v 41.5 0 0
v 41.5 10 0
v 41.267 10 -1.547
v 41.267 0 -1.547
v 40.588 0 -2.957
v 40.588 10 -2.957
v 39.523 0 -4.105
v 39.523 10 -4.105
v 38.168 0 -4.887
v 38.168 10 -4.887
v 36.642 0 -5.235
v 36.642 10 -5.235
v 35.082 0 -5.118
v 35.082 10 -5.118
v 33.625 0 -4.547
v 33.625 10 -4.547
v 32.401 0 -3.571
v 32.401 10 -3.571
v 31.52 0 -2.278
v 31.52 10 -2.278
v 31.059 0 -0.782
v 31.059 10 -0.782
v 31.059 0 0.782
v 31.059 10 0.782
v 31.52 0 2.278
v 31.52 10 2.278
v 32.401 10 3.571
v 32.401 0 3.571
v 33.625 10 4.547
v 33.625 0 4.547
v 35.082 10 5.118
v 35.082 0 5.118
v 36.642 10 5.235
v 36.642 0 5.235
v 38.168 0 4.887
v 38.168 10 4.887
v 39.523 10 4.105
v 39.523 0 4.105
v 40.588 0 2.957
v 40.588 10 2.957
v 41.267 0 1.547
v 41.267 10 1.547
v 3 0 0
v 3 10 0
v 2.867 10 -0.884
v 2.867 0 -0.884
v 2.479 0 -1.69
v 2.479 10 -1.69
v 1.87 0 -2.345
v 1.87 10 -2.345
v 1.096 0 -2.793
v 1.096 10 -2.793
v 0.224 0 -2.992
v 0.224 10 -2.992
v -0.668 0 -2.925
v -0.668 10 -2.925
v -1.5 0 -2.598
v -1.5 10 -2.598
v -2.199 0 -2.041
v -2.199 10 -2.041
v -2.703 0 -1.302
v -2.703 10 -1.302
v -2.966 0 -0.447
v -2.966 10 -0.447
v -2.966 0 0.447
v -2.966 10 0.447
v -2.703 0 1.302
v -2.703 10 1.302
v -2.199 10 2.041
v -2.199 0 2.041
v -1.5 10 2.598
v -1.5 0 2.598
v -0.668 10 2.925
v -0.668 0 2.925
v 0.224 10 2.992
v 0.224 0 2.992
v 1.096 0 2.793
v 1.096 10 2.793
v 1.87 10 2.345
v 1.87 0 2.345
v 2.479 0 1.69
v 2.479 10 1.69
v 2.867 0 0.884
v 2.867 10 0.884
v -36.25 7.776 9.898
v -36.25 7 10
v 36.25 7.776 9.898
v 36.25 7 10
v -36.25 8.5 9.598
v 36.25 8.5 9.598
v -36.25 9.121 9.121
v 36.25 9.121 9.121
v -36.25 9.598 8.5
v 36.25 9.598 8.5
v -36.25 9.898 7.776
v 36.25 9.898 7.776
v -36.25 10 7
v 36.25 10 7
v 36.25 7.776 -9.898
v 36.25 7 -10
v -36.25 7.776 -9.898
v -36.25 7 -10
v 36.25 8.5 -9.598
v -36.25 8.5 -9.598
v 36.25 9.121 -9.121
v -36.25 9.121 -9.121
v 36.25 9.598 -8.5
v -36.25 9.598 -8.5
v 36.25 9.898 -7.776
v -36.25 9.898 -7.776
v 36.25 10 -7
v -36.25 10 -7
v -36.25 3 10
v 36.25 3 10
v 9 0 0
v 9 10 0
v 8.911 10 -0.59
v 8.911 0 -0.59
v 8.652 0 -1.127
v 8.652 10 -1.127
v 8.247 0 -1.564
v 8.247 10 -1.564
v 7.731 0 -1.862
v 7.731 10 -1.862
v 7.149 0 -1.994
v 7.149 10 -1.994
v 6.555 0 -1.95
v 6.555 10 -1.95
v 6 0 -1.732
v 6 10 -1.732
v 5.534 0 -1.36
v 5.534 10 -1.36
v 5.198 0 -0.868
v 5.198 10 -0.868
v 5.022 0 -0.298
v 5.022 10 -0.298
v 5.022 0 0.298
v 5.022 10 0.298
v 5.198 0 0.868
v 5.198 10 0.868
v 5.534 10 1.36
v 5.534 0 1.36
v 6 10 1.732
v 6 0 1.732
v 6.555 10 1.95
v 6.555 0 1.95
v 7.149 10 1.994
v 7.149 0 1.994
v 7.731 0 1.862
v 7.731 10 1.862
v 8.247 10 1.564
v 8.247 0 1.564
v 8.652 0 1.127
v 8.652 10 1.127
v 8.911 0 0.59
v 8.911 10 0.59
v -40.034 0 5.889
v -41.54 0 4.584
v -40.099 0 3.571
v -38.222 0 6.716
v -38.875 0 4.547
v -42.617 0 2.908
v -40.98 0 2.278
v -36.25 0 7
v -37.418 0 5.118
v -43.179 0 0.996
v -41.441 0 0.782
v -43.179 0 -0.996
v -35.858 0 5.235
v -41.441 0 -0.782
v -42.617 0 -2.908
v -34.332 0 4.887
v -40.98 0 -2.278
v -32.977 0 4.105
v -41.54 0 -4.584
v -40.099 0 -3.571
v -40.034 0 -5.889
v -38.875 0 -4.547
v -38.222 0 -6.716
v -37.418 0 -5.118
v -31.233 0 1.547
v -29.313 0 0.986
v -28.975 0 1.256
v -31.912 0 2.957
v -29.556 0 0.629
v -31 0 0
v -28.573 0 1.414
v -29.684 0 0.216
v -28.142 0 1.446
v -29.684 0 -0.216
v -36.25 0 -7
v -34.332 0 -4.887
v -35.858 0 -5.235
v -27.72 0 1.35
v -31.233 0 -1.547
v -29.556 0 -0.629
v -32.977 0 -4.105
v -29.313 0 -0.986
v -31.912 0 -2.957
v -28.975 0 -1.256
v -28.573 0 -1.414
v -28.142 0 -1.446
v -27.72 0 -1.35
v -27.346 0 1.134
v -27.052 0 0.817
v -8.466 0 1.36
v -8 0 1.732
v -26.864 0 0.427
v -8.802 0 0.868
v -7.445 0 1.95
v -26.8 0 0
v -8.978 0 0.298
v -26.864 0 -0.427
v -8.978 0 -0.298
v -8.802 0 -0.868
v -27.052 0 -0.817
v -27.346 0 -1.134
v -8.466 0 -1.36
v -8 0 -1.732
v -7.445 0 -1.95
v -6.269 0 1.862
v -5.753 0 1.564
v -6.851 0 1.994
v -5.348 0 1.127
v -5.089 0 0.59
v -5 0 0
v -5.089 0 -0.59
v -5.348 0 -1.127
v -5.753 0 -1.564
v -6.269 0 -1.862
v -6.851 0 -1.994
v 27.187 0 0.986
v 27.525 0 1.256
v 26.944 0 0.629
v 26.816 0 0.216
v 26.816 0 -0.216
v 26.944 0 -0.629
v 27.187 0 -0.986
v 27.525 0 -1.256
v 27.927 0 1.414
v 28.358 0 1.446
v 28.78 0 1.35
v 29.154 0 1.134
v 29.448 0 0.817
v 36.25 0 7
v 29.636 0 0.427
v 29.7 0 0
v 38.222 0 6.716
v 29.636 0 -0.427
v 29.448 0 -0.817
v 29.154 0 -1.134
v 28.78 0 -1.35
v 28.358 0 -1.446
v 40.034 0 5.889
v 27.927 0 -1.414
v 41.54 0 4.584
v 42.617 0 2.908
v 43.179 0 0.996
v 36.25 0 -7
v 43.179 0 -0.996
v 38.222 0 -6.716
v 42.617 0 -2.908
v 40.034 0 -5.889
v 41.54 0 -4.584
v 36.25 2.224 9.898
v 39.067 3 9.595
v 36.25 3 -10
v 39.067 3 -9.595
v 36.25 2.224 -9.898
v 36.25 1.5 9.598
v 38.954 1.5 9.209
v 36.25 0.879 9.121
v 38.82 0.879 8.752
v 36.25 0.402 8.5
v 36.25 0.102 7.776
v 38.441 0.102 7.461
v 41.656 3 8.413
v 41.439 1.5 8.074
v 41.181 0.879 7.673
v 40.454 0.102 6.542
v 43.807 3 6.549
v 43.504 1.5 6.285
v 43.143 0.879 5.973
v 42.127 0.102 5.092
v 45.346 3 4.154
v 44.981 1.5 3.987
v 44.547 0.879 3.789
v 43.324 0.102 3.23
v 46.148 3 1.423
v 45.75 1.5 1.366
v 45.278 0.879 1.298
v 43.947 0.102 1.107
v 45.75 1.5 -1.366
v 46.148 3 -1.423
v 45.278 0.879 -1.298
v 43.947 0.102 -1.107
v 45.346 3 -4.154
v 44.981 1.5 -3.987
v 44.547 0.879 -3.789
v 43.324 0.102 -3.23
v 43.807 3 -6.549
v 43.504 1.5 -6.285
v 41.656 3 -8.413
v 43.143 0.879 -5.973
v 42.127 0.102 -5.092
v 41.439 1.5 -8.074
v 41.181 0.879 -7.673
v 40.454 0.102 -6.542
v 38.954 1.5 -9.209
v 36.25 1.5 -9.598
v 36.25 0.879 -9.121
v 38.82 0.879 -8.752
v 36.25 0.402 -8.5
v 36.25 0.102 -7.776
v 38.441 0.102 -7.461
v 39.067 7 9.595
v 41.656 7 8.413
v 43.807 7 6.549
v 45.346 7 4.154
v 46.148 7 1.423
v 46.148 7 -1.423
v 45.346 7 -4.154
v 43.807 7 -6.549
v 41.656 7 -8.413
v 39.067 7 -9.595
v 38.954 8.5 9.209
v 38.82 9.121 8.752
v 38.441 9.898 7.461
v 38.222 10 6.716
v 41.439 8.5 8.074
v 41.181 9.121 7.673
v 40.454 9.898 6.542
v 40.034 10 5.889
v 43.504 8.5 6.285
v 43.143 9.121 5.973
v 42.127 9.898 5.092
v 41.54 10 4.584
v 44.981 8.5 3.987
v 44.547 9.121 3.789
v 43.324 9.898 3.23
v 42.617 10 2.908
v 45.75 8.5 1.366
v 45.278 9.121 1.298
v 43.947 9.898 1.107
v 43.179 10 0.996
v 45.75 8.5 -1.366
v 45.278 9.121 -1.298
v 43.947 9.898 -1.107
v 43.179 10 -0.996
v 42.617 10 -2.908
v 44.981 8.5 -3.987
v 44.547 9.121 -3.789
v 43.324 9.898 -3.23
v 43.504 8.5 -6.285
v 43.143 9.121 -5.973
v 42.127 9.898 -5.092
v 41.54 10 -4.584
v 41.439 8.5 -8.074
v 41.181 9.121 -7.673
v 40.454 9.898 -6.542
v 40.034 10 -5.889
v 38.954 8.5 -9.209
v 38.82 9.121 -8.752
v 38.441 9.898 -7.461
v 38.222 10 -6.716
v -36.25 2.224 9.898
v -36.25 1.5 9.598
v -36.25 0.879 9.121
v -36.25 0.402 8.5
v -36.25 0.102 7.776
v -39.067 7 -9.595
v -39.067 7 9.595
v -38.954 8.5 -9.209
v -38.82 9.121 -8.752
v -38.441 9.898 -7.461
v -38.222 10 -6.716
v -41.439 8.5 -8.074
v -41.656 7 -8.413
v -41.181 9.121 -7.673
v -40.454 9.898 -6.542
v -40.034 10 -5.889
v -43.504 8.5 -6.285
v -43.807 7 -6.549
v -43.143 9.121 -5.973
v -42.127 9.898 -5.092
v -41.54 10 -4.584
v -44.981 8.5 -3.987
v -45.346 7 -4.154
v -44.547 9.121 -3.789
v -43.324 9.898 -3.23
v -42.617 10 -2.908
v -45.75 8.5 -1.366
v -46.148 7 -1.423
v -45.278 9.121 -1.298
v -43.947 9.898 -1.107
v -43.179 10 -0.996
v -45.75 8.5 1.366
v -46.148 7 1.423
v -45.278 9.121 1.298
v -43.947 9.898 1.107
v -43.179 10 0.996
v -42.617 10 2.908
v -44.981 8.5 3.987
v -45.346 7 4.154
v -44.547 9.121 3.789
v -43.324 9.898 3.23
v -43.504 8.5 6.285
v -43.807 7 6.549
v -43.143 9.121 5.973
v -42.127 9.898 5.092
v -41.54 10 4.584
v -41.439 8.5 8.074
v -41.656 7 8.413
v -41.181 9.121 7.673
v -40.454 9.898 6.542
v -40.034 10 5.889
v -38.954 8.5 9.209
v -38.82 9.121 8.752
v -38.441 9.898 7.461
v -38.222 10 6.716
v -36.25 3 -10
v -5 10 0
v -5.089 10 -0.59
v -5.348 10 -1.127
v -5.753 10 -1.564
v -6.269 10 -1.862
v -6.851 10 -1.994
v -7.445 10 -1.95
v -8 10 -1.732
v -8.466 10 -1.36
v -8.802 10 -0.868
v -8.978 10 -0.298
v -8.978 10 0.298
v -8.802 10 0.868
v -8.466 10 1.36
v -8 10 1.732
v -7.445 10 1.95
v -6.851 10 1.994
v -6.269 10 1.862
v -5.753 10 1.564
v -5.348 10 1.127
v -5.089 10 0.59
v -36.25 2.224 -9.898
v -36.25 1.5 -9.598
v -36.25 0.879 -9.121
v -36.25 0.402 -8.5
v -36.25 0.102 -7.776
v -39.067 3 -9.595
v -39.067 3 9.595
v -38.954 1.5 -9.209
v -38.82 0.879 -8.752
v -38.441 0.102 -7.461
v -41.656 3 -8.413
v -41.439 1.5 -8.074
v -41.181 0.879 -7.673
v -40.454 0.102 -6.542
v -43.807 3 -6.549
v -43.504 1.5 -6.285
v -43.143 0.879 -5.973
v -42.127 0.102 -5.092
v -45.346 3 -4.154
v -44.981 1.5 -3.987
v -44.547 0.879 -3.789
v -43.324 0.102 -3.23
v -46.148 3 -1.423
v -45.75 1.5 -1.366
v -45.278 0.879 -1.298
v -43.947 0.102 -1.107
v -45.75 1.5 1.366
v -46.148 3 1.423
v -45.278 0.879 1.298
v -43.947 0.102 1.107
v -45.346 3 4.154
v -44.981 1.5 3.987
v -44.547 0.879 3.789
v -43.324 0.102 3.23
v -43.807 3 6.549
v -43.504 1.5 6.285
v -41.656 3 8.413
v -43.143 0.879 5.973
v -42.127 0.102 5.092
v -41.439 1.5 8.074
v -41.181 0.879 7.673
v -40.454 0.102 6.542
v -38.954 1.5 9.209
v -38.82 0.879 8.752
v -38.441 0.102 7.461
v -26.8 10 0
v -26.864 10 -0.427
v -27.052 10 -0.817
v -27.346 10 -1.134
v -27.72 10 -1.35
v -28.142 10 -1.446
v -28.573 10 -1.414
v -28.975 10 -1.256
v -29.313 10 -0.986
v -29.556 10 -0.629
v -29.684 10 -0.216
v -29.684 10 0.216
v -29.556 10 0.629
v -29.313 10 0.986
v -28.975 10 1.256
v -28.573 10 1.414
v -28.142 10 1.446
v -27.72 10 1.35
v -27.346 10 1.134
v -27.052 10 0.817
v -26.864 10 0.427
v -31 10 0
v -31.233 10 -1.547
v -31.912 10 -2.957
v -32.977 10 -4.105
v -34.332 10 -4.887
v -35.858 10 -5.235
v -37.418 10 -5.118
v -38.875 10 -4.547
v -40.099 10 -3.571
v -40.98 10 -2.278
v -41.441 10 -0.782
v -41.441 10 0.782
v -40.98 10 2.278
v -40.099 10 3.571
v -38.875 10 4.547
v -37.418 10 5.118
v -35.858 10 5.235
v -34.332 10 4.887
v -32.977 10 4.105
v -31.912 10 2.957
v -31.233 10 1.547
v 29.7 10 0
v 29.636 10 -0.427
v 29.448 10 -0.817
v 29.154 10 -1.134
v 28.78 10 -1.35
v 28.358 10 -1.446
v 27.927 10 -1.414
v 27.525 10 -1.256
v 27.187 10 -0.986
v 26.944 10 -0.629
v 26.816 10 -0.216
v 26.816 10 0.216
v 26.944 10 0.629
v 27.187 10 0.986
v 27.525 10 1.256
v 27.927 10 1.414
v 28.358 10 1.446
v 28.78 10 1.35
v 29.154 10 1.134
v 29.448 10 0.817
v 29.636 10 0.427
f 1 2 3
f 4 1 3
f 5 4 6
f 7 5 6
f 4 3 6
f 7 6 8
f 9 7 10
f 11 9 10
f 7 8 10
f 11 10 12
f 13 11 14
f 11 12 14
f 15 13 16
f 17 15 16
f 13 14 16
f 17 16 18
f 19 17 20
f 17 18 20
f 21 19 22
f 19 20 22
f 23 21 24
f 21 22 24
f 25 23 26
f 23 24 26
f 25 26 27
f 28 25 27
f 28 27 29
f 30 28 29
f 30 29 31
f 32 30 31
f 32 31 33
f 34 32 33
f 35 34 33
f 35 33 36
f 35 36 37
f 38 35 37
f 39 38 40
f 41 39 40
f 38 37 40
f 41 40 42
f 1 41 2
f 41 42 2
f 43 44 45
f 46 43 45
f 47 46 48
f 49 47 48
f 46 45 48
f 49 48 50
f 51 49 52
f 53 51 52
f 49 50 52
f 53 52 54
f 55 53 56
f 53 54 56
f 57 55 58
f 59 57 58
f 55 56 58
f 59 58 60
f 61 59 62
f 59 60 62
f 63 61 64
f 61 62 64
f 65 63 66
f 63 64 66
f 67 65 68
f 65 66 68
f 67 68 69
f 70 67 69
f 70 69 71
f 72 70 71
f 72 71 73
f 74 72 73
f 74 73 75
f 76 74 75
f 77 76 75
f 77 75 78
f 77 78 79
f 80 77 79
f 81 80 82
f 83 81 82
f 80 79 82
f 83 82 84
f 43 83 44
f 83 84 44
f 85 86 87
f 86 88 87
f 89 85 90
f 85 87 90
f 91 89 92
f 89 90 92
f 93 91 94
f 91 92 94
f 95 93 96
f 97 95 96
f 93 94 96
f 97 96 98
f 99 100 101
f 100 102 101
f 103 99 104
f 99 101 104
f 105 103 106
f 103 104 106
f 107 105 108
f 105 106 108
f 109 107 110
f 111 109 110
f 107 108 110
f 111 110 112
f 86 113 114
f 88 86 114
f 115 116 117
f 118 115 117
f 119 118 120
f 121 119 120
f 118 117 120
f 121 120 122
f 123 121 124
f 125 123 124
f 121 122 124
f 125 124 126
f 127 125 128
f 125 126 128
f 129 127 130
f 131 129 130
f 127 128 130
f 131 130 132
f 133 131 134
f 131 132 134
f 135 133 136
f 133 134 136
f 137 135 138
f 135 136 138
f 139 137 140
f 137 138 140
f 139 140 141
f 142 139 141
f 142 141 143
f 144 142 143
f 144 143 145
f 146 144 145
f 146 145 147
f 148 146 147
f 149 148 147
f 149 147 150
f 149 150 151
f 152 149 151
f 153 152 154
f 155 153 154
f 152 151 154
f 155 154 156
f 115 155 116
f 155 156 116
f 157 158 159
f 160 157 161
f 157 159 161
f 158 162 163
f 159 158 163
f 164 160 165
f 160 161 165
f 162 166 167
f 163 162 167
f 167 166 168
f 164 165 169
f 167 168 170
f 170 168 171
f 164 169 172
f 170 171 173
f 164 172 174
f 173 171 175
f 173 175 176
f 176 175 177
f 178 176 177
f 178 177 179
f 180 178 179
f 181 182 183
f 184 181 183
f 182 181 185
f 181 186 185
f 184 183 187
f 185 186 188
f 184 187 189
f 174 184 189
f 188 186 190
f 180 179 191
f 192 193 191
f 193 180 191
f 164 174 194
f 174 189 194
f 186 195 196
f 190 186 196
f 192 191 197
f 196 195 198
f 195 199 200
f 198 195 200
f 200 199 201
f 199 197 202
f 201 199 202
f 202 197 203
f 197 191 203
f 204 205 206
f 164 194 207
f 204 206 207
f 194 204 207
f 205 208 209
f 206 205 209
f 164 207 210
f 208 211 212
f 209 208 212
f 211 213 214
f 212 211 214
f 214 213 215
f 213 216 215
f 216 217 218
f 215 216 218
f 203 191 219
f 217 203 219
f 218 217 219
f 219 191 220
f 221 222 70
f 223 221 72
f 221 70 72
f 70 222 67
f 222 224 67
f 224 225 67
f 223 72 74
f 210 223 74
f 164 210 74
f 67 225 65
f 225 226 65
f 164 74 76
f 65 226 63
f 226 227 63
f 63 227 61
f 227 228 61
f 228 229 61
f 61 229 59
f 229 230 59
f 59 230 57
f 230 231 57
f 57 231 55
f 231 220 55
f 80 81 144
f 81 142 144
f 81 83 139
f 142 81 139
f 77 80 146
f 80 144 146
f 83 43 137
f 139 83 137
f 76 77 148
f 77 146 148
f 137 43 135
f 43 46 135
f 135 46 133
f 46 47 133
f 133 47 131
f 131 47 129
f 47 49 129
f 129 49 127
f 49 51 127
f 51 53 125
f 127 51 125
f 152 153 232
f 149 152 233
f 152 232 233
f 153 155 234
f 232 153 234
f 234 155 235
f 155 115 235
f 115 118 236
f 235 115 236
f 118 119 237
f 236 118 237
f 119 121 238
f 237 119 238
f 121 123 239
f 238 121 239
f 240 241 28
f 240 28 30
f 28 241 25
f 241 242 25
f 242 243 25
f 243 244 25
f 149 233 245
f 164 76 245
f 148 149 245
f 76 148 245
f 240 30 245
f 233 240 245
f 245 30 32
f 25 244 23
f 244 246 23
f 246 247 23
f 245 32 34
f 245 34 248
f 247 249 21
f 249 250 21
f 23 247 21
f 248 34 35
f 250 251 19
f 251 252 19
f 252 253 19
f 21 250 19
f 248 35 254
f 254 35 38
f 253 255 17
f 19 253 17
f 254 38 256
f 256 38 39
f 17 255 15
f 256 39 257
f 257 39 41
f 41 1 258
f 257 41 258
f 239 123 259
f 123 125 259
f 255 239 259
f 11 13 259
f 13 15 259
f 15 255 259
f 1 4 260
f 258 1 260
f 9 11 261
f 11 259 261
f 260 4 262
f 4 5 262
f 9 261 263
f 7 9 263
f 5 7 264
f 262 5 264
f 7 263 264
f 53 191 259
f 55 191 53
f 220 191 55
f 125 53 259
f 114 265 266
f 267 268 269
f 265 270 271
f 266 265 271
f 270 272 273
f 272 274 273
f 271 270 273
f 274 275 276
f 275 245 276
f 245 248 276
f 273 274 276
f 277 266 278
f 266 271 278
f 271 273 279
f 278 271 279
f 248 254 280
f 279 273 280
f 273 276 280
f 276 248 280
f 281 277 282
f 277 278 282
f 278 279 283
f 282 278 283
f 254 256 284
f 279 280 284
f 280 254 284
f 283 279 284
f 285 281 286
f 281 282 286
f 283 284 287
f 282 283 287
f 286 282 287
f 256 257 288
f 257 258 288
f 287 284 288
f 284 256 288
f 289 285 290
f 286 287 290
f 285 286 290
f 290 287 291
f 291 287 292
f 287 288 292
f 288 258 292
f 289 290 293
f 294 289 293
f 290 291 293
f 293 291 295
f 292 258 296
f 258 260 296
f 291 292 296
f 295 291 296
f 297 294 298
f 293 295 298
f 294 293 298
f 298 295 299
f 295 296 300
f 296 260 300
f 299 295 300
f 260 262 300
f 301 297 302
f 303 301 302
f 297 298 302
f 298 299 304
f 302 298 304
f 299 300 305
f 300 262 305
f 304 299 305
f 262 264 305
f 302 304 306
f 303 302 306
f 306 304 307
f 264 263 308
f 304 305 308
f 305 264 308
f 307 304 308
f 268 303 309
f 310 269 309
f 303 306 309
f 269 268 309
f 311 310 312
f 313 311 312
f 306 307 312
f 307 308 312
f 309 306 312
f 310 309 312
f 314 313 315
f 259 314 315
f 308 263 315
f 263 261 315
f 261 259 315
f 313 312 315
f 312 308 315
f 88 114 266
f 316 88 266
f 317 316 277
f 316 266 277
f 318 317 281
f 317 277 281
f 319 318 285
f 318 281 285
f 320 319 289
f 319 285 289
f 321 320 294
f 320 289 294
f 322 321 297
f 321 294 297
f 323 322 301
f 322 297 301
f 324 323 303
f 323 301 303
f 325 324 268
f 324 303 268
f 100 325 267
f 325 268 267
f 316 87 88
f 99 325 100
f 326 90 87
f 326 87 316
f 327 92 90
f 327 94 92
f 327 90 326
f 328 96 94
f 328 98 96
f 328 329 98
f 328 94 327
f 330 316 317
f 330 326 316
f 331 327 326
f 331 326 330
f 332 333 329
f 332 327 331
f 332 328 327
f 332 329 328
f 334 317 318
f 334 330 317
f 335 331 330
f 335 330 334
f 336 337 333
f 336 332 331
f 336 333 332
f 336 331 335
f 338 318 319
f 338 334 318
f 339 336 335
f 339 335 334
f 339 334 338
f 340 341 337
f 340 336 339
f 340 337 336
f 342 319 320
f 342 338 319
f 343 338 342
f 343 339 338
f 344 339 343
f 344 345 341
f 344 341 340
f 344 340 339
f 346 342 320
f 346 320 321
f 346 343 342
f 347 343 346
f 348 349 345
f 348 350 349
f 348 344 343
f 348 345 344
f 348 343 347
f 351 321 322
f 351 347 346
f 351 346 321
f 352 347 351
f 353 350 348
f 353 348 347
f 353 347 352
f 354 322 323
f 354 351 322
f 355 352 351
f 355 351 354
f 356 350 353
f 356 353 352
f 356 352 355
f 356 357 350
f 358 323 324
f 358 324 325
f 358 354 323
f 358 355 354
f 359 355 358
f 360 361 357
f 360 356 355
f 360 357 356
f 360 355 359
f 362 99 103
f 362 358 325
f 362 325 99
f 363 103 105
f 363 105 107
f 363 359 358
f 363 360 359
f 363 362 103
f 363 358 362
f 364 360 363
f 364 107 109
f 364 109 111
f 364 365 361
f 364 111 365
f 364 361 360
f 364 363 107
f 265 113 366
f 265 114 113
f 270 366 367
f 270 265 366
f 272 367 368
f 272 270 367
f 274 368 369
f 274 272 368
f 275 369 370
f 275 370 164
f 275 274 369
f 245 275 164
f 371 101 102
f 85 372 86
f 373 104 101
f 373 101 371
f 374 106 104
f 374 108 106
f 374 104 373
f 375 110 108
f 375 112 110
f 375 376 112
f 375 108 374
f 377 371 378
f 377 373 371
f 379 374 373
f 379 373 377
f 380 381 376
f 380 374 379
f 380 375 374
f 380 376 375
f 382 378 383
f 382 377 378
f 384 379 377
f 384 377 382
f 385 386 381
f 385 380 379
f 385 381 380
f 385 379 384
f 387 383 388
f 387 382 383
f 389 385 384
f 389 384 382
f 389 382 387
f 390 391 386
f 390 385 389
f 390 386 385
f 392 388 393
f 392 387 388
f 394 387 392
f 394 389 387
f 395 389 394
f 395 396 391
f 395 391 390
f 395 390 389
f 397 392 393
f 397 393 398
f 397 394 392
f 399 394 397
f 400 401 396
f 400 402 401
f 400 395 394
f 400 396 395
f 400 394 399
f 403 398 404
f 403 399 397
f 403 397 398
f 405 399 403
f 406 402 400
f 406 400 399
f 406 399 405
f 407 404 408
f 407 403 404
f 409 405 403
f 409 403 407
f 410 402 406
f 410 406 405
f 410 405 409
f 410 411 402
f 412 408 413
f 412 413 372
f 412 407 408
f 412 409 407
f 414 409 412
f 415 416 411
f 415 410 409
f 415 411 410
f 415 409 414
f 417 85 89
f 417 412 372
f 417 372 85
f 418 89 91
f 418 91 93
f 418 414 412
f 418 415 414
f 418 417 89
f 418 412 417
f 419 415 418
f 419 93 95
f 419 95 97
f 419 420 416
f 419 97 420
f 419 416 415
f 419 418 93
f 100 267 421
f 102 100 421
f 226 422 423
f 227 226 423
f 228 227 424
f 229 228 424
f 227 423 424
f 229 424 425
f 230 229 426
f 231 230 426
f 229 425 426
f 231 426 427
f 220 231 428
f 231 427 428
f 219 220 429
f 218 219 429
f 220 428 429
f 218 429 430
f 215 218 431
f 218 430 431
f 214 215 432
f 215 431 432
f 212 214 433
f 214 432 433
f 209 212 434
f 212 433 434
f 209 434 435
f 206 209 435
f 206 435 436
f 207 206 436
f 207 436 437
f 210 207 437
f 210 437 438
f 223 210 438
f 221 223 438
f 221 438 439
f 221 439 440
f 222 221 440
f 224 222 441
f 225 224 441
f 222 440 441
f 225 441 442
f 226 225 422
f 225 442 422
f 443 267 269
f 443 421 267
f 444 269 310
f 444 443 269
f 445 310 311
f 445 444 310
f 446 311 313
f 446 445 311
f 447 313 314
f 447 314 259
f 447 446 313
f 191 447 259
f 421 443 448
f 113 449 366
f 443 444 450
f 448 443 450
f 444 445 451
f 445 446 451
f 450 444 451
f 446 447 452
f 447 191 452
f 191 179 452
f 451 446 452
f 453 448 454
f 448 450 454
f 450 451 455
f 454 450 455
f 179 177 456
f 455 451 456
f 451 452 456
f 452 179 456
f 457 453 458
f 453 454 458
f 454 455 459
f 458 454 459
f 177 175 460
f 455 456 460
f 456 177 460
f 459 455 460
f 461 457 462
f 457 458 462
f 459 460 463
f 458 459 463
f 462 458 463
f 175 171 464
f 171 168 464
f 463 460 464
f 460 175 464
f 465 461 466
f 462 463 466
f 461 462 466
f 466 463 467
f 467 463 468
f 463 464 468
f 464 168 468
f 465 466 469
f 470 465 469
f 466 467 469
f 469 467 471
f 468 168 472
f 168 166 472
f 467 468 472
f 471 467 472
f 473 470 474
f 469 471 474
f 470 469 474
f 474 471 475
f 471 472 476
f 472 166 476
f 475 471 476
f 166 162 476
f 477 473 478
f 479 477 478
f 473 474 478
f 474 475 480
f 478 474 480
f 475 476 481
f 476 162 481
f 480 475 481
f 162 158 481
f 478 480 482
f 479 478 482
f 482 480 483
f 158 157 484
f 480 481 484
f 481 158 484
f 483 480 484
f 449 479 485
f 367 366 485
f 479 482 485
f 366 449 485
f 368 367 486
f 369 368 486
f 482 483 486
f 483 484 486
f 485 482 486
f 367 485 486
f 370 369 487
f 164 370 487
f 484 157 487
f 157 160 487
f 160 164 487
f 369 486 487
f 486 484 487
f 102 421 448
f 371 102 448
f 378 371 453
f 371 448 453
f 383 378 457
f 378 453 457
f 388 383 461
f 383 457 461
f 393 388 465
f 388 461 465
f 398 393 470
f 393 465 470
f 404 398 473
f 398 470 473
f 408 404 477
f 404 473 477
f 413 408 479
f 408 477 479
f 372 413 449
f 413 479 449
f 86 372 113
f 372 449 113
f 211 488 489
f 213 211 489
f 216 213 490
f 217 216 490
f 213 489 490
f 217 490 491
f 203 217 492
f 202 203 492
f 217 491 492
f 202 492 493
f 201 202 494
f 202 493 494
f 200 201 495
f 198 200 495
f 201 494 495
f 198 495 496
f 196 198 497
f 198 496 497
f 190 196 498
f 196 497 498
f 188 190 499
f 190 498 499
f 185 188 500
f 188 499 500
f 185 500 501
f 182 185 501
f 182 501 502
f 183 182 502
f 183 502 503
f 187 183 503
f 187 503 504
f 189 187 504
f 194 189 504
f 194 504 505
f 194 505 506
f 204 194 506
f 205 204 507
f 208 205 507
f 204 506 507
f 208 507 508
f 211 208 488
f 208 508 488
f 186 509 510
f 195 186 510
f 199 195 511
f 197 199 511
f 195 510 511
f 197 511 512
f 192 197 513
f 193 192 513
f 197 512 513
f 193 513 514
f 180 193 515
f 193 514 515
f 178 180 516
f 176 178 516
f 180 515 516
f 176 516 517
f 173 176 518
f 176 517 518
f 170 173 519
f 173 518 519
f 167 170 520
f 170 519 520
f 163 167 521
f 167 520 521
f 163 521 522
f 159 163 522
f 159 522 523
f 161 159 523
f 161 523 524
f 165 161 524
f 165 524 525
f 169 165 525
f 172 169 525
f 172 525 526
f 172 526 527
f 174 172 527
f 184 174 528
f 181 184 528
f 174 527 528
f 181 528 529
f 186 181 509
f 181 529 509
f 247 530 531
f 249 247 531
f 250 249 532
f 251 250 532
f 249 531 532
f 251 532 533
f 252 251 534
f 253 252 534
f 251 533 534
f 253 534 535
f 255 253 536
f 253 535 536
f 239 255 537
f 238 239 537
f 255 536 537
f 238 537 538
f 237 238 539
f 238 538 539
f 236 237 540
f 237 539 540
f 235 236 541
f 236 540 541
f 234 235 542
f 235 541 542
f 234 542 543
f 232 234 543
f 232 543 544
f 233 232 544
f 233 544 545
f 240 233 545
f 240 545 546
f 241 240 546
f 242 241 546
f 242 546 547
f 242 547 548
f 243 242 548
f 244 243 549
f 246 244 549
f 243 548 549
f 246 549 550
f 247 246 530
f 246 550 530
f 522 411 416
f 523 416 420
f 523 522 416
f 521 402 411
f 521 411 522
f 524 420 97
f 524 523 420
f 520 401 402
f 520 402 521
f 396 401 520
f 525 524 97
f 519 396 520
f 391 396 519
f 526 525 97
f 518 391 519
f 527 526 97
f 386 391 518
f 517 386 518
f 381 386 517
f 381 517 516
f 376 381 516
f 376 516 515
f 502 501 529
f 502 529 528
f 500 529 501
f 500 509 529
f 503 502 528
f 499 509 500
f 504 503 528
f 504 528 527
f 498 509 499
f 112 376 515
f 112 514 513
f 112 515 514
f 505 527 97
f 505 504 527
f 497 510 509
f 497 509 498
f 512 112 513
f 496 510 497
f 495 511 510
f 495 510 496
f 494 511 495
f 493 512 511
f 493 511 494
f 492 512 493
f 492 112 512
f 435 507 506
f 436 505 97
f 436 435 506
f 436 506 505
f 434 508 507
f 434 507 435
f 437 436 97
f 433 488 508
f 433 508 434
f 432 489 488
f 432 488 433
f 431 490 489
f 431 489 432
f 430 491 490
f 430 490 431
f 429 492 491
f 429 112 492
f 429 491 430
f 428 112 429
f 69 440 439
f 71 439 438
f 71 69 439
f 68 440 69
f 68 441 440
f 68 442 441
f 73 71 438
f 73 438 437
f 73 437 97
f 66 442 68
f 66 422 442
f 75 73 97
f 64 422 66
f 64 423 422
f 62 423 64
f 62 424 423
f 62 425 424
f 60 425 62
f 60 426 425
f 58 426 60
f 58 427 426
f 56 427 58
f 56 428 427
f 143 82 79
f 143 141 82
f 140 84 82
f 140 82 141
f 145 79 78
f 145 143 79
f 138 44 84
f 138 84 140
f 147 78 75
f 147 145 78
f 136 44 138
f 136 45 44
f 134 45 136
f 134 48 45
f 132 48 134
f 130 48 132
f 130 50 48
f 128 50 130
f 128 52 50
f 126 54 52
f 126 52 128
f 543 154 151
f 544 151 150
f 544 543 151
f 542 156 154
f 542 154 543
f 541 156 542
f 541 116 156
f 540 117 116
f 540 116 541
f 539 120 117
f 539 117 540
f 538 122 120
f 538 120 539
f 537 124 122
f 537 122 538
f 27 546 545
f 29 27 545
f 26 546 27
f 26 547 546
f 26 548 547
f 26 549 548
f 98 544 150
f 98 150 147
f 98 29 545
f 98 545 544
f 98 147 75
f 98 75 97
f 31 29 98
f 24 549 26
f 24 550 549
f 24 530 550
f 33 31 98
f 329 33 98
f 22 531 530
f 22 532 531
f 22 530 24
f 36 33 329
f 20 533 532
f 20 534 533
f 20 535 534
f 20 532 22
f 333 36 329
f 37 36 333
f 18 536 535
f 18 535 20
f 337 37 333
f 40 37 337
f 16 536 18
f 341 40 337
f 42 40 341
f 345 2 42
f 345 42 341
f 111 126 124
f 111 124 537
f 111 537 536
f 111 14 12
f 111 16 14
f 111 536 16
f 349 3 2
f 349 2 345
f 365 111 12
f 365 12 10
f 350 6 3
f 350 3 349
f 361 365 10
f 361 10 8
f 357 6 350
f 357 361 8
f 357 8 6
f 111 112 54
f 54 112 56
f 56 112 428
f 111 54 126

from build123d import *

# Parameters (mm, degrees)
SKETCH2_R           = 5
BOSS_EXTRUDE1_DEPTH = 10
FILLET1_R           = 3
BOSS_EXTRUDE2_DEPTH = 10
SKETCH5_R           = 5
SKETCH5_R_2         = 4.5
BOSS_EXTRUDE3_DEPTH = 10
SKETCH6_R           = 2
CUT_EXTRUDE1_DEPTH  = 10
SKETCH7_R           = 3
CUT_EXTRUDE2_DEPTH  = 10
SKETCH8_R           = 4.65
CUT_EXTRUDE3_DEPTH  = 17
SKETCH9_R           = 4.65
SKETCH9_R_2         = 5.25
CUT_EXTRUDE4_DEPTH  = 10
SKETCH9_3_R         = 1.45
CUT_EXTRUDE5_DEPTH  = 10


with BuildPart() as part:
    # Sketch2 → Boss-Extrude1 (new body)
    with BuildSketch(Plane(origin=(0, 0, 0), x_dir=(1, 0, 0), z_dir=(0, 1, 0))):
        with BuildLine():
            Line((36.25, 10), (-36.25, 10))
            ThreePointArc((-36.25, 10), (-46.25, 0), (-36.25, -10))
            Line((-36.25, -10), (36.25, -10))
            ThreePointArc((36.25, -10), (46.25, 0), (36.25, 10))
        make_face()
        with Locations((-36.25, 0)):
            Circle(SKETCH2_R, mode=Mode.SUBTRACT)
        with BuildLine():
            ThreePointArc((5, 0), (3.535533906, -3.535533906), (0, -5))
            ThreePointArc((0, -5), (-5, 0), (0, 5))
            ThreePointArc((0, 5), (3.535533906, 3.535533906), (5, 0))
        make_face(mode=Mode.SUBTRACT)
        with Locations((36.25, 0)):
            Circle(SKETCH2_R, mode=Mode.SUBTRACT)
    extrude(amount=BOSS_EXTRUDE1_DEPTH)

    # Fillet1
    fillet1_edges = [part.edges().sort_by_distance(p)[0] for p in [
        (46.25, 0, 0),
        (0, 0, 10),
        (0, 10, 10),
        (46.25, 10, 0),
        (0, 10, -10),
        (-46.25, 10, 0),
        (-46.25, 0, 0),
        (0, 0, -10),
    ]]
    fillet(fillet1_edges, radius=FILLET1_R)

    # Sketch3 → Boss-Extrude2 (add)
    with BuildSketch(Plane(origin=(0, 10, 0), x_dir=(1, 0, 0), z_dir=(0, 1, 0))):
        with BuildLine():
            Line((5, 0), (0, 0))
            Line((0, 0), (-5, 0))
            ThreePointArc((-5, 0), (0, -5), (5, 0))
        make_face()
        with BuildLine():
            Line((-5, 0), (0, 0))
            Line((0, 0), (5, 0))
            ThreePointArc((5, 0), (0, 5), (-5, 0))
        make_face()
    extrude(amount=-BOSS_EXTRUDE2_DEPTH)

    # Sketch5 → Boss-Extrude3 (add)
    with BuildSketch(Plane(origin=(0, 10, 0), x_dir=(1, 0, 0), z_dir=(0, 1, 0))):
        with Locations((-36.25, 0)):
            Circle(SKETCH5_R)
        with Locations((-36.25, 0)):
            Circle(SKETCH5_R_2, mode=Mode.SUBTRACT)
        with Locations((36.25, 0)):
            Circle(SKETCH5_R)
        with Locations((36.25, 0)):
            Circle(SKETCH5_R_2, mode=Mode.SUBTRACT)
    extrude(amount=-BOSS_EXTRUDE3_DEPTH)

    # Sketch6 → Cut-Extrude1 (cut)
    with BuildSketch(Plane(origin=(0, 10, 0), x_dir=(1, 0, 0), z_dir=(0, 1, 0))):
        with Locations((-7, 0)):
            Circle(SKETCH6_R)
        with Locations((7, 0)):
            Circle(SKETCH6_R)
    extrude(amount=-CUT_EXTRUDE1_DEPTH, mode=Mode.SUBTRACT)

    # Sketch7 → Cut-Extrude2 (cut)
    with BuildSketch(Plane(origin=(0, 10, 0), x_dir=(1, 0, 0), z_dir=(0, 1, 0))):
        Circle(SKETCH7_R)
    extrude(amount=-CUT_EXTRUDE2_DEPTH, mode=Mode.SUBTRACT)

    # Sketch8 → Cut-Extrude3 (cut)
    with BuildSketch(Plane(origin=(0, 10, 0), x_dir=(1, 0, 0), z_dir=(0, 1, 0))):
        with Locations((-36.25, 0)):
            Circle(SKETCH8_R)
        with Locations((36.25, 0)):
            Circle(SKETCH8_R)
    extrude(amount=-CUT_EXTRUDE3_DEPTH, mode=Mode.SUBTRACT)

    # Sketch9 → Cut-Extrude4 (cut)
    with BuildSketch(Plane(origin=(0, 10, 0), x_dir=(1, 0, 0), z_dir=(0, 1, 0))):
        with Locations((-36.25, 0)):
            Circle(SKETCH9_R)
        with Locations((36.25, 0)):
            Circle(SKETCH9_R)
        with Locations((-36.25, 0)):
            Circle(SKETCH9_R_2)
        with Locations((-36.25, 0)):
            Circle(SKETCH9_R, mode=Mode.SUBTRACT)
        with Locations((36.25, 0)):
            Circle(SKETCH9_R_2)
        with Locations((36.25, 0)):
            Circle(SKETCH9_R, mode=Mode.SUBTRACT)
    extrude(amount=-CUT_EXTRUDE4_DEPTH, mode=Mode.SUBTRACT)

    # Sketch9<3> → Cut-Extrude5 (cut)
    with BuildSketch(Plane(origin=(0, 10, 0), x_dir=(1, 0, 0), z_dir=(0, 1, 0))):
        with Locations((-28.25, 0)):
            Circle(SKETCH9_3_R)
        with Locations((28.25, 0)):
            Circle(SKETCH9_3_R)
    extrude(amount=-CUT_EXTRUDE5_DEPTH, mode=Mode.SUBTRACT)


solid = part.part
